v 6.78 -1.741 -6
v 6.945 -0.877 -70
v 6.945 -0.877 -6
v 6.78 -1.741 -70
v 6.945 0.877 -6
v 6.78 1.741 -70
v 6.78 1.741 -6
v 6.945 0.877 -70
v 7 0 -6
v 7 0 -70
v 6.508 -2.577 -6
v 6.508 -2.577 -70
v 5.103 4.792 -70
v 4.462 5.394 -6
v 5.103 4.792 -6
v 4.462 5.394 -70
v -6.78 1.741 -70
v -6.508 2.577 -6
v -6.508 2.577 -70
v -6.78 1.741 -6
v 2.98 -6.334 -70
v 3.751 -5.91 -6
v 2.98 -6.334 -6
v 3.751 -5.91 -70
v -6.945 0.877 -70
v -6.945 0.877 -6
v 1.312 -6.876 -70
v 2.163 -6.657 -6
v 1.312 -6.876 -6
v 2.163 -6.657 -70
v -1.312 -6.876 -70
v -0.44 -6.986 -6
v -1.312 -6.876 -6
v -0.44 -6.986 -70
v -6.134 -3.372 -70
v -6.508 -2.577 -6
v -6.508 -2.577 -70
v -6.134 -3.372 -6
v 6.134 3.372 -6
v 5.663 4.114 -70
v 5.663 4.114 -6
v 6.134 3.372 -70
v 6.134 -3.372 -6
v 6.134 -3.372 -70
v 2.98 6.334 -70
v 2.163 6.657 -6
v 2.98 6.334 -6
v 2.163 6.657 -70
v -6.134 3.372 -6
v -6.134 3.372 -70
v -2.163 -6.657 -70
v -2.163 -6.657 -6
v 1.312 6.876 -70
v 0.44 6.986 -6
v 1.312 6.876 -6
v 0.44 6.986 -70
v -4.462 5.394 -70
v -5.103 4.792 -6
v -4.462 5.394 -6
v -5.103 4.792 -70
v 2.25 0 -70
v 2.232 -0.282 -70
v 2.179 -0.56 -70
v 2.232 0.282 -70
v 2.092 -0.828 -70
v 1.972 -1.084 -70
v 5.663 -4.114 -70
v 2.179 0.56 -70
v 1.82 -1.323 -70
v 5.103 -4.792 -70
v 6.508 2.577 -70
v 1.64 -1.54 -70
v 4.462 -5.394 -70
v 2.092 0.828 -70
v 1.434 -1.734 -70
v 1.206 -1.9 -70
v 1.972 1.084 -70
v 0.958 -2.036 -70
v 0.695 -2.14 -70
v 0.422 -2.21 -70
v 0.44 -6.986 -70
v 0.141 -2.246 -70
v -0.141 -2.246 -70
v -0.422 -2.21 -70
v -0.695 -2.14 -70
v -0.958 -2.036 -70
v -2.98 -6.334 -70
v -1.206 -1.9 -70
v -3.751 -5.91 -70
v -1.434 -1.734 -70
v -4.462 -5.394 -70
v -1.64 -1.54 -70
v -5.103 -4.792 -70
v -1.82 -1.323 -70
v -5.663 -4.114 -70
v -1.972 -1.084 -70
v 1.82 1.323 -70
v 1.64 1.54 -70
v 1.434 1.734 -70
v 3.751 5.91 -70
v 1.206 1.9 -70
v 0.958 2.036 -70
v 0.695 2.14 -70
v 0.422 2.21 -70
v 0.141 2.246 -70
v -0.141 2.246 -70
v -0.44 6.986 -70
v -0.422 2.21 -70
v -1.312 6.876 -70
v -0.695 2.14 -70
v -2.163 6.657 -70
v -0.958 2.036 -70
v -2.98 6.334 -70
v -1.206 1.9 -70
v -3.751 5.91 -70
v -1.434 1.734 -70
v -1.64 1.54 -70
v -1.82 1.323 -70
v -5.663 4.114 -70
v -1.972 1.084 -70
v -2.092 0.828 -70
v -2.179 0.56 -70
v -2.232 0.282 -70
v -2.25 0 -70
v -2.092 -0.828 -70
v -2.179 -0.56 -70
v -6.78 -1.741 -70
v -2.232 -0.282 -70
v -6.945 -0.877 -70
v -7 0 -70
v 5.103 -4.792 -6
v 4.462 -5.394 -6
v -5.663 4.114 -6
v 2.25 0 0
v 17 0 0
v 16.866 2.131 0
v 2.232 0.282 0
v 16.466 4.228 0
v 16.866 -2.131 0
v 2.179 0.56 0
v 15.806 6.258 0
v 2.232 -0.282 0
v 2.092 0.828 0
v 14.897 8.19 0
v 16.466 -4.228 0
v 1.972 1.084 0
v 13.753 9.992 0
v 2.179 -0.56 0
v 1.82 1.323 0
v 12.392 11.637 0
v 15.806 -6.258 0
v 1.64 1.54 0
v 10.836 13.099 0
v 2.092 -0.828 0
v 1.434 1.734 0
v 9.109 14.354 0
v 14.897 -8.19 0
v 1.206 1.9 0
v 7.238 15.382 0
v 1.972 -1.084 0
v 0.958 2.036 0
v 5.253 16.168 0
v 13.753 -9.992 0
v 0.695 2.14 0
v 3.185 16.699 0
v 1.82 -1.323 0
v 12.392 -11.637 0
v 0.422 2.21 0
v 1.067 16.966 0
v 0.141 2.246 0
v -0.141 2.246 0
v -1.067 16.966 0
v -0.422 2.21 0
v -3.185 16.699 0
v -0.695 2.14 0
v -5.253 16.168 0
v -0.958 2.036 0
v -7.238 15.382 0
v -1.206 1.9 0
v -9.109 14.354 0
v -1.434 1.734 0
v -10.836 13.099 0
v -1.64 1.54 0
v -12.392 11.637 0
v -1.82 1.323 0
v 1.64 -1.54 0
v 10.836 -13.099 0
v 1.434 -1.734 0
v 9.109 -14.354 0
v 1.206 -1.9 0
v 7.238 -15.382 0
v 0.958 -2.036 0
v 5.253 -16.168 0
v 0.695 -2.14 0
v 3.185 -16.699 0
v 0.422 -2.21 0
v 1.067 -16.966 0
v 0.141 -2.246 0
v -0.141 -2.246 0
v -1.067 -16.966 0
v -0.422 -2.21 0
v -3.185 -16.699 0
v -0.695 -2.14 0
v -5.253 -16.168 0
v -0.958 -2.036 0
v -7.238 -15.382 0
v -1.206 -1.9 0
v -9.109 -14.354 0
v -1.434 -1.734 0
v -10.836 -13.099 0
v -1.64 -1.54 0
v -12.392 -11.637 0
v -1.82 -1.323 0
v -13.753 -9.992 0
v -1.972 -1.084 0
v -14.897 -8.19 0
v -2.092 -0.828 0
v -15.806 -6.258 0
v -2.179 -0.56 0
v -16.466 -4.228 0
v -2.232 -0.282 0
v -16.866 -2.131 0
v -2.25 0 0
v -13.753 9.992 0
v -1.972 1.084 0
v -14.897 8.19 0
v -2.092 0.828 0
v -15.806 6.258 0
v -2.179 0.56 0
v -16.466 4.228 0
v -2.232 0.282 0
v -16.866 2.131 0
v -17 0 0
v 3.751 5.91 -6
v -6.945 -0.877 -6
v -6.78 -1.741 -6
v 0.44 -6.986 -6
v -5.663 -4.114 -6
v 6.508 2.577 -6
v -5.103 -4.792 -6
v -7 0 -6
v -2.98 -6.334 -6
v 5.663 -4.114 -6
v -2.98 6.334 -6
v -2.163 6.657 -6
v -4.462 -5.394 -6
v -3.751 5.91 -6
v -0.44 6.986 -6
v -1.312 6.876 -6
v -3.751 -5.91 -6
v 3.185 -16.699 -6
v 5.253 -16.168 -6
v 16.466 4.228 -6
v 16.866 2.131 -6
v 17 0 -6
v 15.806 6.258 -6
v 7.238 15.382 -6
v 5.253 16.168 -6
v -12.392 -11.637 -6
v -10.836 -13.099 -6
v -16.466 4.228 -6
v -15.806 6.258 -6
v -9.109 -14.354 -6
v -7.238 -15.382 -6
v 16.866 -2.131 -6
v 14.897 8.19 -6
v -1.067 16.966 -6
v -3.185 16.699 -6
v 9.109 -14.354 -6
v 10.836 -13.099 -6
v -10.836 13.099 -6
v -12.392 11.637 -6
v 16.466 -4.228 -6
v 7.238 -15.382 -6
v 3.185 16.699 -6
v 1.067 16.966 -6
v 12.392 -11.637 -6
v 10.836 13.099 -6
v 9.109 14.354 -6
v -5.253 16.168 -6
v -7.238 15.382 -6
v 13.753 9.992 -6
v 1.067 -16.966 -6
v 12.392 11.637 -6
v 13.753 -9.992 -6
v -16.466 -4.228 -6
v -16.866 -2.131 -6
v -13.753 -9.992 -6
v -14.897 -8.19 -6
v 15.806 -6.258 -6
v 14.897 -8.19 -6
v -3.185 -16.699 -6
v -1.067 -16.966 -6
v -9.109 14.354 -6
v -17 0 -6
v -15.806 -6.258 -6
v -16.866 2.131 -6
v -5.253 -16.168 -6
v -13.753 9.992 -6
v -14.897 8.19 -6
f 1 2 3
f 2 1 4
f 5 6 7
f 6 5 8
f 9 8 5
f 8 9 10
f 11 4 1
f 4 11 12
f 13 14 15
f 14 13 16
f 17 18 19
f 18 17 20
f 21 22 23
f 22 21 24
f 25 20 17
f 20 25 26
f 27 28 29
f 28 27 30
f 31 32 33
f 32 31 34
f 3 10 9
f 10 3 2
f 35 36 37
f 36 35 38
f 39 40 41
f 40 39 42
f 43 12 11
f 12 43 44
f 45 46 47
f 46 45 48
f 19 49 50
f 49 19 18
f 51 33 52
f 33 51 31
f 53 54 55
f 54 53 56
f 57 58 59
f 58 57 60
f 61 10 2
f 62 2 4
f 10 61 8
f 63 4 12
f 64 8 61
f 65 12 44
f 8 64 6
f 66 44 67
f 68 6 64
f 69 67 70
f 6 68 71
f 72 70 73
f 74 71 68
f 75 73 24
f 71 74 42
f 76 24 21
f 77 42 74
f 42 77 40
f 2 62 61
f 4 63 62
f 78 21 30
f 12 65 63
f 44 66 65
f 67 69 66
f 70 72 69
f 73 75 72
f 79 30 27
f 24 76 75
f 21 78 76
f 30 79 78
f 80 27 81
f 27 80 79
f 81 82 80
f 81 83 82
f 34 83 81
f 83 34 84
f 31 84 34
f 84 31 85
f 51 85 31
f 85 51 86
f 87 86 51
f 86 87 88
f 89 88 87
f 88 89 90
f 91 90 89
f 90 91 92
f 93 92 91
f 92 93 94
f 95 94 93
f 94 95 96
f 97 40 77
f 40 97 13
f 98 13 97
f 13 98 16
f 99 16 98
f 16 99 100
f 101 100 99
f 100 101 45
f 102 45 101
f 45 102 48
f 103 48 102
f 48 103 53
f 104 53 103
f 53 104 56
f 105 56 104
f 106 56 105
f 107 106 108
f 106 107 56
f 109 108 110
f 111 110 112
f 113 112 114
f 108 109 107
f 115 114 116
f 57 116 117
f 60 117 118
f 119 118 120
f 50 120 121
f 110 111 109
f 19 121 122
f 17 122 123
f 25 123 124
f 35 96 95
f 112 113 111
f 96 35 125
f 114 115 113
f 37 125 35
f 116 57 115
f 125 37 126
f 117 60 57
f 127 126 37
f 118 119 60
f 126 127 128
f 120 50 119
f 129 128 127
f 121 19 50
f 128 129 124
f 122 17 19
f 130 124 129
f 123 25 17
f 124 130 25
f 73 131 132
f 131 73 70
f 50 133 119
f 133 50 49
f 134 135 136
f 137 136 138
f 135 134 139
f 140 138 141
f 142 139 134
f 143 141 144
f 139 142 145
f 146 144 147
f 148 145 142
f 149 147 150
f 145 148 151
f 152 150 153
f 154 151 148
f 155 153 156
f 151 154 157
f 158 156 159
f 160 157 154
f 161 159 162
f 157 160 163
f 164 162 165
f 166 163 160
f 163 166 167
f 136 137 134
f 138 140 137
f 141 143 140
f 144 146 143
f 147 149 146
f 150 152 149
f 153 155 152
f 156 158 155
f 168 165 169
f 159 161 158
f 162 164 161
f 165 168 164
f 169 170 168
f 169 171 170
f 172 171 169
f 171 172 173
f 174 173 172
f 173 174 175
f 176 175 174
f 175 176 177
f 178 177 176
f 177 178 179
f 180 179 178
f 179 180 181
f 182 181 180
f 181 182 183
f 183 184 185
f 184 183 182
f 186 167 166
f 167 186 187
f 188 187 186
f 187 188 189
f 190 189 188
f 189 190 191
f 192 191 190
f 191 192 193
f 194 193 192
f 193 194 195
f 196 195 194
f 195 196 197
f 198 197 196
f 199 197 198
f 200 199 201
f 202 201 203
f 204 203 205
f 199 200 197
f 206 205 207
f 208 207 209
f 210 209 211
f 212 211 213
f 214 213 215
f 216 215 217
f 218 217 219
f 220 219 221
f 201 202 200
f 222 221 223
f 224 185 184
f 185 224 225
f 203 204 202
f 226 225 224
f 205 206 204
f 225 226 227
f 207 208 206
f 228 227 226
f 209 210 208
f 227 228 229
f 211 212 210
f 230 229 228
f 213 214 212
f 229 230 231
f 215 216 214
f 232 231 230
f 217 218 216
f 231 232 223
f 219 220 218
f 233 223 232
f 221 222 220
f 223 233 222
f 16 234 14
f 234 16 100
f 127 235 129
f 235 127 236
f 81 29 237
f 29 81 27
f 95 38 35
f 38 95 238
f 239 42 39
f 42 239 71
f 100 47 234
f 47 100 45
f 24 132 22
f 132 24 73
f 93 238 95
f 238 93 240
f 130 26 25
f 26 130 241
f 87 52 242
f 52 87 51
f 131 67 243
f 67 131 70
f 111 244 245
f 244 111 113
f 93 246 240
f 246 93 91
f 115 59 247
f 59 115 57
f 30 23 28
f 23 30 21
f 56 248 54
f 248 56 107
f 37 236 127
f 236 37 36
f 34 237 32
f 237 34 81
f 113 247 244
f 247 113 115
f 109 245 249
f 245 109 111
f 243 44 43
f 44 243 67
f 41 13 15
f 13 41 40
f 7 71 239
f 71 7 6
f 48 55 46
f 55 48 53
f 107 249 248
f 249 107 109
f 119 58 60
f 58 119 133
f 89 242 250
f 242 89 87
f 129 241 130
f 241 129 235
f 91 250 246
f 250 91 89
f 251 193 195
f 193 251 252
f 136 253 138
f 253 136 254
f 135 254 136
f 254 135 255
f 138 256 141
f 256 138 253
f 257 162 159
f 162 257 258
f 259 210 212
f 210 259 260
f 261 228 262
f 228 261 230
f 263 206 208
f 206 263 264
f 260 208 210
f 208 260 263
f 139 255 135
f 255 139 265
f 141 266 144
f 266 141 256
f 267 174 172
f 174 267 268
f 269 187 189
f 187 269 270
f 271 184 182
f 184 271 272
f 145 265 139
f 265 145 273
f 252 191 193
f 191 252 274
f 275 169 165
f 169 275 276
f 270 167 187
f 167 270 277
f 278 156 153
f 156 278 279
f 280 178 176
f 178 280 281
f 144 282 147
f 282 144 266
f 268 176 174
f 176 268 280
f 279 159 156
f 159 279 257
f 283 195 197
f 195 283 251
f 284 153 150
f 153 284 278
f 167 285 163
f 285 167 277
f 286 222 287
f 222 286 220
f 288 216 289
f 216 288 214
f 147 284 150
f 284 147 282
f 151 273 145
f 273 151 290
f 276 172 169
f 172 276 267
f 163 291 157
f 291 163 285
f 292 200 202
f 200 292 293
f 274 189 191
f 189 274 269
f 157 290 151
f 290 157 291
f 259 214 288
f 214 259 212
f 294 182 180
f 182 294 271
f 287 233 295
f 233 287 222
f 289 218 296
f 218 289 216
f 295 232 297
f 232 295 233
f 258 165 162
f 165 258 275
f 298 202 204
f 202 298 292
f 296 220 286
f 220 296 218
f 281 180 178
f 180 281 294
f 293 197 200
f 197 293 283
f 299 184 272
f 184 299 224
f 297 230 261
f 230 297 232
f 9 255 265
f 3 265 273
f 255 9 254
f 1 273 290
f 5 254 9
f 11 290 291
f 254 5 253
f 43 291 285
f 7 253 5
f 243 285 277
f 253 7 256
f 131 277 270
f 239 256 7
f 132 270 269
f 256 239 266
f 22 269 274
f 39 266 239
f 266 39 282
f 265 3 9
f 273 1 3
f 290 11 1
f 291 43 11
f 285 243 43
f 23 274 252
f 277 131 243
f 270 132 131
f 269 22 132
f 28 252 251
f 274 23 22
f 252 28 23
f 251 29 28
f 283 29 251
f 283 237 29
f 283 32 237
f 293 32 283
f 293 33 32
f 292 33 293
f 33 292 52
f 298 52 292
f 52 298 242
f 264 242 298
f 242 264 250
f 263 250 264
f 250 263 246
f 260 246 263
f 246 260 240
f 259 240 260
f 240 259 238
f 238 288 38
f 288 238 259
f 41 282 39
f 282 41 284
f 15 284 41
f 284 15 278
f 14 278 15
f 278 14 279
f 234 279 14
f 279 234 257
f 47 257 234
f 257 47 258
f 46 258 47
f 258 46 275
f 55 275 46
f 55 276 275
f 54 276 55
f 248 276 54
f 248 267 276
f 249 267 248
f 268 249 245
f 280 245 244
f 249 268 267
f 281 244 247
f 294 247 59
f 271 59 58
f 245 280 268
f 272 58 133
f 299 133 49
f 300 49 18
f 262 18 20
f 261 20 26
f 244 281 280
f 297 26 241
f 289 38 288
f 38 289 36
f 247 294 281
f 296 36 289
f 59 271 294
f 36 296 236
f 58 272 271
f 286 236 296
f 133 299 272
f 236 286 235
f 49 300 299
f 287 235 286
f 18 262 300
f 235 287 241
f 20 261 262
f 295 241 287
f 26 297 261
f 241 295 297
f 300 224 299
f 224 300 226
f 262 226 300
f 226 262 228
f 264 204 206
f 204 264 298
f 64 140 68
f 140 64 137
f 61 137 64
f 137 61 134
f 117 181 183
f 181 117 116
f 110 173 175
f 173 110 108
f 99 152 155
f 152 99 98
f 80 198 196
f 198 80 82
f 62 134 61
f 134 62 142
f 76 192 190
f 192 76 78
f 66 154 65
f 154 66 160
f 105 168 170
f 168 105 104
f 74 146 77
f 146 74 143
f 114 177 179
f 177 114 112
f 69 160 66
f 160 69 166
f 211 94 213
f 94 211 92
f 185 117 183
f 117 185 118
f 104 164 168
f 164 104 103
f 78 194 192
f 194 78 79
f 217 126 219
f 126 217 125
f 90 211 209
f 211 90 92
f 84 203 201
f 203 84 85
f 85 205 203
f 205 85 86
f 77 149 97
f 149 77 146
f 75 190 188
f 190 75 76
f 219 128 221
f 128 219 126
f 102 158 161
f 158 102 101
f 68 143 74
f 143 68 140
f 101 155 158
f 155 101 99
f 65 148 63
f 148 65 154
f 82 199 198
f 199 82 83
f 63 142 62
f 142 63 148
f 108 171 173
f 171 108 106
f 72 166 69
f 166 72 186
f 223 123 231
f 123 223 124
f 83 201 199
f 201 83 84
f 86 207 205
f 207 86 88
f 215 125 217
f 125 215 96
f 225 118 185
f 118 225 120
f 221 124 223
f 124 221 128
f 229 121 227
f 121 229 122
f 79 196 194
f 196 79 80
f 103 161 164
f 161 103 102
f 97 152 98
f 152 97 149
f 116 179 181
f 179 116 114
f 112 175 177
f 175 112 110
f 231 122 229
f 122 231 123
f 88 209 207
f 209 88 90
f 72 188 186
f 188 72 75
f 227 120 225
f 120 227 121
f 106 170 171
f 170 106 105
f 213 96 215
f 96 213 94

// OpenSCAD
$fn = 50;


difference() {
	union() {
		translate(v = [0, 0, -70.0000000000]) {
			cylinder(h = 70, r = 7.0000000000);
		}
		translate(v = [0, 0, -6.0000000000]) {
			cylinder(h = 6, r = 17.0000000000);
		}
	}
	union() {
		#translate(v = [0, 0, -70]) {
			cylinder(h = 70, r = 2.2500000000);
		}
	}
}
